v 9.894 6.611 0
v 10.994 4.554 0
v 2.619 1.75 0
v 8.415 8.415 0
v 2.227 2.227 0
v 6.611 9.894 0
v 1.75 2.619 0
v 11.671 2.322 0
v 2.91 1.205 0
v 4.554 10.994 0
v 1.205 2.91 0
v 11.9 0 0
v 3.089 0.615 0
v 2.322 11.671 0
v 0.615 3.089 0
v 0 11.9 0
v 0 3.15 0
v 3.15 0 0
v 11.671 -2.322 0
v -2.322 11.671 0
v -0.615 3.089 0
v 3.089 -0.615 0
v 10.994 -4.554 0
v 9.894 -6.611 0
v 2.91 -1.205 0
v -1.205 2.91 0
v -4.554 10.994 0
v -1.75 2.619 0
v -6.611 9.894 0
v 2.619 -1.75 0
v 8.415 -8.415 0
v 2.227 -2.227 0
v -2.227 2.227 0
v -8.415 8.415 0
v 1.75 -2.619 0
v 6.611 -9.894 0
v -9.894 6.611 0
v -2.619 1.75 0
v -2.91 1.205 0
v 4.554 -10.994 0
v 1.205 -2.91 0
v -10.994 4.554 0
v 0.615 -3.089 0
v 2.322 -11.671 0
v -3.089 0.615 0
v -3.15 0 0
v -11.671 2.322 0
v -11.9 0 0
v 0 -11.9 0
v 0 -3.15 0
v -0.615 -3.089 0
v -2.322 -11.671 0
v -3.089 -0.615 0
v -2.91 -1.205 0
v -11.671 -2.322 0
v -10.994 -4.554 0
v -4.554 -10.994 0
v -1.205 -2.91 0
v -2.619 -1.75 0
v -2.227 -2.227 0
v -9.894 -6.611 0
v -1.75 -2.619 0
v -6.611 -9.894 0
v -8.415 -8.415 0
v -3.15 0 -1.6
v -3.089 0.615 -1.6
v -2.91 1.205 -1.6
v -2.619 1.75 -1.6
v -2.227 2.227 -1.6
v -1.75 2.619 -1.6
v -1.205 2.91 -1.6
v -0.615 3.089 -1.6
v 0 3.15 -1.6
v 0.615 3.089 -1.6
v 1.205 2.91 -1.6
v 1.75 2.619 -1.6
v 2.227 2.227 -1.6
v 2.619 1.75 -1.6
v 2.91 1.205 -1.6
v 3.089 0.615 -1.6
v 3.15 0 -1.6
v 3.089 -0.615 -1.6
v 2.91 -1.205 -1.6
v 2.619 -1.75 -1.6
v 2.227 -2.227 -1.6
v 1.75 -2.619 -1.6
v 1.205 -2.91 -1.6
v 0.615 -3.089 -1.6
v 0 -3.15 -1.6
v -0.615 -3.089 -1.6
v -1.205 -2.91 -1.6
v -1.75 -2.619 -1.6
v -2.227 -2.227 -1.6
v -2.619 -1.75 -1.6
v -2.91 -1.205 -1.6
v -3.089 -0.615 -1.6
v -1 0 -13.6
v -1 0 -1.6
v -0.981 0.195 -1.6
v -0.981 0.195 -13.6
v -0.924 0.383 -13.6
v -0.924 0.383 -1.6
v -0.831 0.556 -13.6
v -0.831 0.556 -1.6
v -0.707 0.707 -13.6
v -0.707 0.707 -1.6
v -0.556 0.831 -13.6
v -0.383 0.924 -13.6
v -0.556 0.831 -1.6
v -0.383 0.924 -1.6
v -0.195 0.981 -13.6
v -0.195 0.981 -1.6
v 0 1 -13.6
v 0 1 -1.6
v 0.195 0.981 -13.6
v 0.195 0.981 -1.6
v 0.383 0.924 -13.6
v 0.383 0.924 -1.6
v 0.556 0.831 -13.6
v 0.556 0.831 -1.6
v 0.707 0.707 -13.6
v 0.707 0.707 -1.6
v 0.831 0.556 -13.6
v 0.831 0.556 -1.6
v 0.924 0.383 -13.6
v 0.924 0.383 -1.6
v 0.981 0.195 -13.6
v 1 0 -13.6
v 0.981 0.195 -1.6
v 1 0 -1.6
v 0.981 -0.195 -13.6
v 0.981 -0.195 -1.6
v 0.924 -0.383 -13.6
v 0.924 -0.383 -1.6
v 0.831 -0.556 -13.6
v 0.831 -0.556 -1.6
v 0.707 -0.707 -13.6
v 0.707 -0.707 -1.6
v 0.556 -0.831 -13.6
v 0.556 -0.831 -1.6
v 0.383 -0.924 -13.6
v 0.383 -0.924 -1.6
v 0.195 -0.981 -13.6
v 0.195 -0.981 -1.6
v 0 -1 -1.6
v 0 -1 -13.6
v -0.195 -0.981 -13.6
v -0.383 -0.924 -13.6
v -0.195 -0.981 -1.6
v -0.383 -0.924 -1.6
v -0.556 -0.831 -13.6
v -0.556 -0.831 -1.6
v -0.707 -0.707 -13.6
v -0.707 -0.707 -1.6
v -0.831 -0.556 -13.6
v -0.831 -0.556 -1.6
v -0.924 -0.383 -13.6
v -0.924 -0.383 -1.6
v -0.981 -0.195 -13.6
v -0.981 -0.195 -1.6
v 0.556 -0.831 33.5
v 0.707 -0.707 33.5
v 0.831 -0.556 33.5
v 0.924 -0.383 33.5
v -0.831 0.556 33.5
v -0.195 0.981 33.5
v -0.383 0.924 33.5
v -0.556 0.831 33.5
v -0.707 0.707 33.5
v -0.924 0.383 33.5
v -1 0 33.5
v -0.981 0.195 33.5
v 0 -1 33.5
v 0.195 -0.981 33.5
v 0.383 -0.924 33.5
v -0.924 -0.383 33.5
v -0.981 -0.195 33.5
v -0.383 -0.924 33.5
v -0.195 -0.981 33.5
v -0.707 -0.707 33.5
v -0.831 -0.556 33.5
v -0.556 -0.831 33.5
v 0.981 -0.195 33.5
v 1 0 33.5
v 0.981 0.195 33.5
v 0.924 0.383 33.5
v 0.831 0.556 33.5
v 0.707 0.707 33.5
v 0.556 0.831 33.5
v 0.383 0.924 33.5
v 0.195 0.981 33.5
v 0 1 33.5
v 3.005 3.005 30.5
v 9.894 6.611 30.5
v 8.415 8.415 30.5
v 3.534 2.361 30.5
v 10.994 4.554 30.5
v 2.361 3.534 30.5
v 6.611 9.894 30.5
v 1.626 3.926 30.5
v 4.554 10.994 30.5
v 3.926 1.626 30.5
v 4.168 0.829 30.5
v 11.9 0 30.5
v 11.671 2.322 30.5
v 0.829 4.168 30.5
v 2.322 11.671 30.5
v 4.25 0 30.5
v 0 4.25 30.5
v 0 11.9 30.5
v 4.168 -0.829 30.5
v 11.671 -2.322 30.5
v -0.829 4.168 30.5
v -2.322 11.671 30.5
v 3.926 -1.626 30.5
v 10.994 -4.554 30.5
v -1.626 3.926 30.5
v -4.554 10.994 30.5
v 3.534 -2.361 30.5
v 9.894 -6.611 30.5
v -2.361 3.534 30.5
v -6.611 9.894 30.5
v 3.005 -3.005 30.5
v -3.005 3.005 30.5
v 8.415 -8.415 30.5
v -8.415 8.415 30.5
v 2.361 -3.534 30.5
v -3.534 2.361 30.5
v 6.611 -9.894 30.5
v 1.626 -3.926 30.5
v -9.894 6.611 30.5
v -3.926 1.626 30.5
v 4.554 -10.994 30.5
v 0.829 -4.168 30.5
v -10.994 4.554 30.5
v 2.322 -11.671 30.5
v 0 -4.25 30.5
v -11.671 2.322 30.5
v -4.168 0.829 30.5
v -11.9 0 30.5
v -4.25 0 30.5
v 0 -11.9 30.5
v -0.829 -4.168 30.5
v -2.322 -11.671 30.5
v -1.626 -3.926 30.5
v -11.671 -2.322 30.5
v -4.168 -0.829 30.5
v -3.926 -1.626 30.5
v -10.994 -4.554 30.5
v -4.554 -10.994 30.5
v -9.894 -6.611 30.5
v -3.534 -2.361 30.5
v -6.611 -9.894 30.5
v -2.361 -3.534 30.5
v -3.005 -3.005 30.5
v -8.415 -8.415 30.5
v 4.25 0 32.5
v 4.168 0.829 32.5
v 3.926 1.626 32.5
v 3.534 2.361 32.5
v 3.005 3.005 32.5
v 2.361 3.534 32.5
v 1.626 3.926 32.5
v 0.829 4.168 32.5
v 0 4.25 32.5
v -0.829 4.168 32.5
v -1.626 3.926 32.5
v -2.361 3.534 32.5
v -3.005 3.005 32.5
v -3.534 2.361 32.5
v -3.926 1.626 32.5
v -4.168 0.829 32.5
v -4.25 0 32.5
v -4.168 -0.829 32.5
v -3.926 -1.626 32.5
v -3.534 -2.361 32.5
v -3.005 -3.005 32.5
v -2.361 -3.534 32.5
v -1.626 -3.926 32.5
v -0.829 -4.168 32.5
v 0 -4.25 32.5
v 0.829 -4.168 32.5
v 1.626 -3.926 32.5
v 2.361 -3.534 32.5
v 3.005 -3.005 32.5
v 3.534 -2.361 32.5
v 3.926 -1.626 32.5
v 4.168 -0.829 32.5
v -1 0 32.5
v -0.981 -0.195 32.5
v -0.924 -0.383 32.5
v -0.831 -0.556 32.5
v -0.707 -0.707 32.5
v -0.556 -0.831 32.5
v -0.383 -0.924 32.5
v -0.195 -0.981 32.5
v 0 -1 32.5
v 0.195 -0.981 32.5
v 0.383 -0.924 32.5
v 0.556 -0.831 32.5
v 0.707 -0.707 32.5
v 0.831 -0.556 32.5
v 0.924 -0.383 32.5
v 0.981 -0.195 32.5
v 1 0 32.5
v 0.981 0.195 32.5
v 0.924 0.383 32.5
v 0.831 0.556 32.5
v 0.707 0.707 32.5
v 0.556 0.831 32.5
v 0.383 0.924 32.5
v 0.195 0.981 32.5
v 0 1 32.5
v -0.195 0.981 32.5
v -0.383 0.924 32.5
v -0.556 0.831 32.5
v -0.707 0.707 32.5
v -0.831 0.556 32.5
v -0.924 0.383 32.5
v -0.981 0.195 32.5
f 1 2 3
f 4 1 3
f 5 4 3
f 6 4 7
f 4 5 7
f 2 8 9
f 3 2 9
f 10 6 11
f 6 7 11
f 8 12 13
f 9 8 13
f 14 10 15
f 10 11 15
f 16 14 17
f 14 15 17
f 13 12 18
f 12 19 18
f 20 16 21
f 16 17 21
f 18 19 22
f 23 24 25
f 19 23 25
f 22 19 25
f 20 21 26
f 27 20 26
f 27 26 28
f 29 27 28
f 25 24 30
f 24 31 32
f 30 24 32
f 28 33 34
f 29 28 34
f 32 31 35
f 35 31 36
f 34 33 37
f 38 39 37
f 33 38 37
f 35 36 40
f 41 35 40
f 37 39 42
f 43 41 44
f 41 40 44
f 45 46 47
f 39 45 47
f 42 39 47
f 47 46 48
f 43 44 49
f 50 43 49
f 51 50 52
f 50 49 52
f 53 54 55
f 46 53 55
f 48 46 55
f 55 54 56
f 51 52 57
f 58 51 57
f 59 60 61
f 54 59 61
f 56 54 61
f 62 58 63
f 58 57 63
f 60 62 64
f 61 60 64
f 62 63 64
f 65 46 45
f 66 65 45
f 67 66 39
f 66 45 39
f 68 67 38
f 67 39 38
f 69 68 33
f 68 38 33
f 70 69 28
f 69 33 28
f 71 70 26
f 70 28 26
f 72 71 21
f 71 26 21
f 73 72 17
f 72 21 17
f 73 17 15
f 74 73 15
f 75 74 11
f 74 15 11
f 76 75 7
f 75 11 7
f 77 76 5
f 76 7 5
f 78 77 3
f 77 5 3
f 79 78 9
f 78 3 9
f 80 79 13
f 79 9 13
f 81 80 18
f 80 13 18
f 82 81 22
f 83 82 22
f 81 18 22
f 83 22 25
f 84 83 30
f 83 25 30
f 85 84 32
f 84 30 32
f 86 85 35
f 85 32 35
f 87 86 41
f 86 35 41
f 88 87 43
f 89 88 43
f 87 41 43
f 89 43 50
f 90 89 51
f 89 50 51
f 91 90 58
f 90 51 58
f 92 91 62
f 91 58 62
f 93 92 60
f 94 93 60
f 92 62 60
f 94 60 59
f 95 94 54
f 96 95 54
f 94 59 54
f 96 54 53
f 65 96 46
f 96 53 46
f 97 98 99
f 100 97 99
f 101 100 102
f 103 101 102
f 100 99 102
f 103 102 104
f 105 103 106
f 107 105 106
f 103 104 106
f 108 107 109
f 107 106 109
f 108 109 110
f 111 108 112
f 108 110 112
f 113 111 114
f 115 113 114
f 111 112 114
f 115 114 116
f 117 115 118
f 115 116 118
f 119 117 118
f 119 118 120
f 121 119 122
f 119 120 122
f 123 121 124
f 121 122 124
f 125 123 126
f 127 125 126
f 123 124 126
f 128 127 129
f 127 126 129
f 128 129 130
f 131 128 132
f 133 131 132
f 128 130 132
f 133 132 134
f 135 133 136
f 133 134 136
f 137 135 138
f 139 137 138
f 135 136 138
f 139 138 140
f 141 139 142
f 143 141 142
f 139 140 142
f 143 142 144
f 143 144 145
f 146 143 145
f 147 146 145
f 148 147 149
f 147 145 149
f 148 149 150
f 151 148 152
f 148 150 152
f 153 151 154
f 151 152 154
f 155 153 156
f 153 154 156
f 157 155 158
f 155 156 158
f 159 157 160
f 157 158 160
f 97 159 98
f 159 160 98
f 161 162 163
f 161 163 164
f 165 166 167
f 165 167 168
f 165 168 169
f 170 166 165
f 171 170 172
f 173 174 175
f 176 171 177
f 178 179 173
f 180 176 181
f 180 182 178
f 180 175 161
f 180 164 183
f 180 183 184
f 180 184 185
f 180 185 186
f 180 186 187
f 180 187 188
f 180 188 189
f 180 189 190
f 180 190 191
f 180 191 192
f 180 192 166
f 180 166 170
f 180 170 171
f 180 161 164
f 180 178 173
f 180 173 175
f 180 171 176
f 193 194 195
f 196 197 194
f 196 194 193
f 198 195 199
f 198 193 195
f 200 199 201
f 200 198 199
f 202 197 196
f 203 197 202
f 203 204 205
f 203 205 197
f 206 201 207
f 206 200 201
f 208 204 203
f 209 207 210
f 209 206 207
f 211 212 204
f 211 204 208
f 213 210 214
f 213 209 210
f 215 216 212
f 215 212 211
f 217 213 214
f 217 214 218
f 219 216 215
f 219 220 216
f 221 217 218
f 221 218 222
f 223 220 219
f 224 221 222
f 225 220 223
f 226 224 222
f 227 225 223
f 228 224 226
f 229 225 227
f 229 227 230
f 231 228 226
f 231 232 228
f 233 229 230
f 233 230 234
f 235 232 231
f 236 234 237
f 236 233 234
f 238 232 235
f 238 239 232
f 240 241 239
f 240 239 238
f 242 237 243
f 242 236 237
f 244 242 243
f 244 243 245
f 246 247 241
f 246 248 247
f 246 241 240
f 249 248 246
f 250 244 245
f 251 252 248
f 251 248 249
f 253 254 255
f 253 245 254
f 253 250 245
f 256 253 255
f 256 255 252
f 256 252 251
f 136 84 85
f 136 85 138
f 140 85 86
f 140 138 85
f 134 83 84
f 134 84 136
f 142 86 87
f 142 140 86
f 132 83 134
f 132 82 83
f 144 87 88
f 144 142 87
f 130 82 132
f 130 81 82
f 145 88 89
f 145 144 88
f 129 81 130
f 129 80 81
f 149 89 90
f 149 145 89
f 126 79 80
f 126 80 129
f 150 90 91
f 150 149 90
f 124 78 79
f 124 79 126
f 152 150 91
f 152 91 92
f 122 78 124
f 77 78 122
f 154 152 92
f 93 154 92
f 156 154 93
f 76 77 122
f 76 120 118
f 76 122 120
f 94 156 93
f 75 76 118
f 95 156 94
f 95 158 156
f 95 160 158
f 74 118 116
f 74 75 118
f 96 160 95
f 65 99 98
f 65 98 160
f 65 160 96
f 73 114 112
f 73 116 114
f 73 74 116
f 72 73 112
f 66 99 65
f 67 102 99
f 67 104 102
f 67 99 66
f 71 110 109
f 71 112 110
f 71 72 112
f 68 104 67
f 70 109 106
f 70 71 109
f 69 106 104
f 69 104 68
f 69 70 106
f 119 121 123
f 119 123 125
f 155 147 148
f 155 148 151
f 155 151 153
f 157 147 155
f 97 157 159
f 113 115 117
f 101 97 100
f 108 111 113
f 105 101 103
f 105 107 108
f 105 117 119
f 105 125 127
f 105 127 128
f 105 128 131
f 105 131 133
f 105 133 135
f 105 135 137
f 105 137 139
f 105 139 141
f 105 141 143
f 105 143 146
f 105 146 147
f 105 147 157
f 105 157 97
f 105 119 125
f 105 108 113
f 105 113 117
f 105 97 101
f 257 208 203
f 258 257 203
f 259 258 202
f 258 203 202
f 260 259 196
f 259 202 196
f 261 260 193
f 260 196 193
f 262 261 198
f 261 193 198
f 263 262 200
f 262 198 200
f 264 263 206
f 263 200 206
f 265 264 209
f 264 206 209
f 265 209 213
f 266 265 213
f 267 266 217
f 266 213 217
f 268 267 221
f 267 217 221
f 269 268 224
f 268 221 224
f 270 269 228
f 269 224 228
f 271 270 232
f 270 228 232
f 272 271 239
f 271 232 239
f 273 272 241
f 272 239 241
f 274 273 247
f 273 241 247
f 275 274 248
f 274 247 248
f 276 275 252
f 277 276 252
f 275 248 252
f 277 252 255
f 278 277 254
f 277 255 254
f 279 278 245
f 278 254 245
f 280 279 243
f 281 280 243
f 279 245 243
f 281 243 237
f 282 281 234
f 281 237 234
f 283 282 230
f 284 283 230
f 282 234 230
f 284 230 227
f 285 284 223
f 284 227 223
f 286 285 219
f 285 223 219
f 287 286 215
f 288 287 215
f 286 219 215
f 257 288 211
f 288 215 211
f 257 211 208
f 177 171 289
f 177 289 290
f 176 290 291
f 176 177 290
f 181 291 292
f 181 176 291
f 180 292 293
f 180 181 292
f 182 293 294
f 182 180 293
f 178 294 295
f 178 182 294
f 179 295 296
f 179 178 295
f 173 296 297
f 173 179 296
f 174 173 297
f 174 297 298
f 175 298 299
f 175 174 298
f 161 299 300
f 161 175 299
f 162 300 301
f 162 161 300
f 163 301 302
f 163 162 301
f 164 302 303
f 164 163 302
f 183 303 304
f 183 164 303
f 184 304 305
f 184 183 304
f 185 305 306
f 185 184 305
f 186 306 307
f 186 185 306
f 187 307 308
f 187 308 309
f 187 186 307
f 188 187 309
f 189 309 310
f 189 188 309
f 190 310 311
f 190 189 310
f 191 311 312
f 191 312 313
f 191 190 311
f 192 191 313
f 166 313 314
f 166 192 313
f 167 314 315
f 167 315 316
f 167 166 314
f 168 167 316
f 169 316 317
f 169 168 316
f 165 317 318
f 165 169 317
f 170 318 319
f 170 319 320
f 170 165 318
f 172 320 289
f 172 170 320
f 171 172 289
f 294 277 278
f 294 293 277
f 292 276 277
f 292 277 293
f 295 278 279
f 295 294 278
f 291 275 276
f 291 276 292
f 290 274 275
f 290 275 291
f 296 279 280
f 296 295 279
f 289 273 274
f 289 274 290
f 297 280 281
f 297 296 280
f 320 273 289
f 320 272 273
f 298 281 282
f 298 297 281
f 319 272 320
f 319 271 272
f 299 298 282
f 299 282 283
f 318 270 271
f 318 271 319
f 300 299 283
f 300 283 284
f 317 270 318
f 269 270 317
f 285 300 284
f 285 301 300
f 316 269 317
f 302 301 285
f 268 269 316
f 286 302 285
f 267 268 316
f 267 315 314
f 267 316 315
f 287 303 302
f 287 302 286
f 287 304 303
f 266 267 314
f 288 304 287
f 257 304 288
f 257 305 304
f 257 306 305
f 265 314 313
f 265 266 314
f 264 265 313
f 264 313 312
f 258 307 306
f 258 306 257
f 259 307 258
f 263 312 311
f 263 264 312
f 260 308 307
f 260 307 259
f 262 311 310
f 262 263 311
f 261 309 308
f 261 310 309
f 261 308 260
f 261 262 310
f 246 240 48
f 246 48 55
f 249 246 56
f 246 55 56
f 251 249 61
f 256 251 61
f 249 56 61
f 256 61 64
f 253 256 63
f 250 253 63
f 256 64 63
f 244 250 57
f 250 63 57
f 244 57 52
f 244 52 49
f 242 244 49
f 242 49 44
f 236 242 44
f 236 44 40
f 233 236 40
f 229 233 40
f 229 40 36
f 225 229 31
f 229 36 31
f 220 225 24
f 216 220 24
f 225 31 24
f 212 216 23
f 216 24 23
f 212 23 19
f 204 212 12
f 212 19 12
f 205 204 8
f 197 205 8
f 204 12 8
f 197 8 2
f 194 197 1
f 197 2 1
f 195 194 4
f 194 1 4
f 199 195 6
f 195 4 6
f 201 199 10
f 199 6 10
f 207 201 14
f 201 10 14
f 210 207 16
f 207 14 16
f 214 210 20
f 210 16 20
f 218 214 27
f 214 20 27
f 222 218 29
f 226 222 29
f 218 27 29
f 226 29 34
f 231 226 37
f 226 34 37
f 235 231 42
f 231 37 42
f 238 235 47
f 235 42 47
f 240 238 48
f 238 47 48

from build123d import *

# Parameters (mm, degrees)
SKETCH2_R           = 11.9
BOSS_EXTRUDE1_DEPTH = 30.5
SKETCH3_R           = 4.25
BOSS_EXTRUDE2_DEPTH = 2
SKETCH4_R           = 3.15
BOSS_EXTRUDE3_DEPTH = 1.6
SKETCH5_R           = 1
BOSS_EXTRUDE4_DEPTH = 12
BOSS_EXTRUDE5_START = 1
SKETCH6_R           = 1
BOSS_EXTRUDE5_DEPTH = 1


with BuildPart() as part:
    # Sketch2 → Boss-Extrude1 (new body)
    with BuildSketch(Plane.XY):
        with Locations(Location((0, 0, 0), (0, 0, 180))):
            Circle(SKETCH2_R)
    extrude(amount=BOSS_EXTRUDE1_DEPTH)

    # Sketch3 → Boss-Extrude2 (add)
    with BuildSketch(Plane.XY.offset(30.5)):
        Circle(SKETCH3_R)
    extrude(amount=BOSS_EXTRUDE2_DEPTH)

    # Sketch4 → Boss-Extrude3 (add)
    with BuildSketch(Plane(origin=(0, 0, 0), x_dir=(-1, 0, 0), z_dir=(0, 0, -1))):
        Circle(SKETCH4_R)
    extrude(amount=BOSS_EXTRUDE3_DEPTH)

    # Sketch5 → Boss-Extrude4 (add)
    with BuildSketch(Plane(origin=(0, 0, -1.6), x_dir=(-1, 0, 0), z_dir=(0, 0, -1))):
        Circle(SKETCH5_R)
    extrude(amount=BOSS_EXTRUDE4_DEPTH)

    # Sketch6 → Boss-Extrude5 (add)
    with BuildSketch(Plane.XY.offset(32.5).offset(BOSS_EXTRUDE5_START)):
        with Locations(Location((0, 0, 0), (0, 0, 180))):
            Circle(SKETCH6_R)
    extrude(amount=-BOSS_EXTRUDE5_DEPTH)


solid = part.part
